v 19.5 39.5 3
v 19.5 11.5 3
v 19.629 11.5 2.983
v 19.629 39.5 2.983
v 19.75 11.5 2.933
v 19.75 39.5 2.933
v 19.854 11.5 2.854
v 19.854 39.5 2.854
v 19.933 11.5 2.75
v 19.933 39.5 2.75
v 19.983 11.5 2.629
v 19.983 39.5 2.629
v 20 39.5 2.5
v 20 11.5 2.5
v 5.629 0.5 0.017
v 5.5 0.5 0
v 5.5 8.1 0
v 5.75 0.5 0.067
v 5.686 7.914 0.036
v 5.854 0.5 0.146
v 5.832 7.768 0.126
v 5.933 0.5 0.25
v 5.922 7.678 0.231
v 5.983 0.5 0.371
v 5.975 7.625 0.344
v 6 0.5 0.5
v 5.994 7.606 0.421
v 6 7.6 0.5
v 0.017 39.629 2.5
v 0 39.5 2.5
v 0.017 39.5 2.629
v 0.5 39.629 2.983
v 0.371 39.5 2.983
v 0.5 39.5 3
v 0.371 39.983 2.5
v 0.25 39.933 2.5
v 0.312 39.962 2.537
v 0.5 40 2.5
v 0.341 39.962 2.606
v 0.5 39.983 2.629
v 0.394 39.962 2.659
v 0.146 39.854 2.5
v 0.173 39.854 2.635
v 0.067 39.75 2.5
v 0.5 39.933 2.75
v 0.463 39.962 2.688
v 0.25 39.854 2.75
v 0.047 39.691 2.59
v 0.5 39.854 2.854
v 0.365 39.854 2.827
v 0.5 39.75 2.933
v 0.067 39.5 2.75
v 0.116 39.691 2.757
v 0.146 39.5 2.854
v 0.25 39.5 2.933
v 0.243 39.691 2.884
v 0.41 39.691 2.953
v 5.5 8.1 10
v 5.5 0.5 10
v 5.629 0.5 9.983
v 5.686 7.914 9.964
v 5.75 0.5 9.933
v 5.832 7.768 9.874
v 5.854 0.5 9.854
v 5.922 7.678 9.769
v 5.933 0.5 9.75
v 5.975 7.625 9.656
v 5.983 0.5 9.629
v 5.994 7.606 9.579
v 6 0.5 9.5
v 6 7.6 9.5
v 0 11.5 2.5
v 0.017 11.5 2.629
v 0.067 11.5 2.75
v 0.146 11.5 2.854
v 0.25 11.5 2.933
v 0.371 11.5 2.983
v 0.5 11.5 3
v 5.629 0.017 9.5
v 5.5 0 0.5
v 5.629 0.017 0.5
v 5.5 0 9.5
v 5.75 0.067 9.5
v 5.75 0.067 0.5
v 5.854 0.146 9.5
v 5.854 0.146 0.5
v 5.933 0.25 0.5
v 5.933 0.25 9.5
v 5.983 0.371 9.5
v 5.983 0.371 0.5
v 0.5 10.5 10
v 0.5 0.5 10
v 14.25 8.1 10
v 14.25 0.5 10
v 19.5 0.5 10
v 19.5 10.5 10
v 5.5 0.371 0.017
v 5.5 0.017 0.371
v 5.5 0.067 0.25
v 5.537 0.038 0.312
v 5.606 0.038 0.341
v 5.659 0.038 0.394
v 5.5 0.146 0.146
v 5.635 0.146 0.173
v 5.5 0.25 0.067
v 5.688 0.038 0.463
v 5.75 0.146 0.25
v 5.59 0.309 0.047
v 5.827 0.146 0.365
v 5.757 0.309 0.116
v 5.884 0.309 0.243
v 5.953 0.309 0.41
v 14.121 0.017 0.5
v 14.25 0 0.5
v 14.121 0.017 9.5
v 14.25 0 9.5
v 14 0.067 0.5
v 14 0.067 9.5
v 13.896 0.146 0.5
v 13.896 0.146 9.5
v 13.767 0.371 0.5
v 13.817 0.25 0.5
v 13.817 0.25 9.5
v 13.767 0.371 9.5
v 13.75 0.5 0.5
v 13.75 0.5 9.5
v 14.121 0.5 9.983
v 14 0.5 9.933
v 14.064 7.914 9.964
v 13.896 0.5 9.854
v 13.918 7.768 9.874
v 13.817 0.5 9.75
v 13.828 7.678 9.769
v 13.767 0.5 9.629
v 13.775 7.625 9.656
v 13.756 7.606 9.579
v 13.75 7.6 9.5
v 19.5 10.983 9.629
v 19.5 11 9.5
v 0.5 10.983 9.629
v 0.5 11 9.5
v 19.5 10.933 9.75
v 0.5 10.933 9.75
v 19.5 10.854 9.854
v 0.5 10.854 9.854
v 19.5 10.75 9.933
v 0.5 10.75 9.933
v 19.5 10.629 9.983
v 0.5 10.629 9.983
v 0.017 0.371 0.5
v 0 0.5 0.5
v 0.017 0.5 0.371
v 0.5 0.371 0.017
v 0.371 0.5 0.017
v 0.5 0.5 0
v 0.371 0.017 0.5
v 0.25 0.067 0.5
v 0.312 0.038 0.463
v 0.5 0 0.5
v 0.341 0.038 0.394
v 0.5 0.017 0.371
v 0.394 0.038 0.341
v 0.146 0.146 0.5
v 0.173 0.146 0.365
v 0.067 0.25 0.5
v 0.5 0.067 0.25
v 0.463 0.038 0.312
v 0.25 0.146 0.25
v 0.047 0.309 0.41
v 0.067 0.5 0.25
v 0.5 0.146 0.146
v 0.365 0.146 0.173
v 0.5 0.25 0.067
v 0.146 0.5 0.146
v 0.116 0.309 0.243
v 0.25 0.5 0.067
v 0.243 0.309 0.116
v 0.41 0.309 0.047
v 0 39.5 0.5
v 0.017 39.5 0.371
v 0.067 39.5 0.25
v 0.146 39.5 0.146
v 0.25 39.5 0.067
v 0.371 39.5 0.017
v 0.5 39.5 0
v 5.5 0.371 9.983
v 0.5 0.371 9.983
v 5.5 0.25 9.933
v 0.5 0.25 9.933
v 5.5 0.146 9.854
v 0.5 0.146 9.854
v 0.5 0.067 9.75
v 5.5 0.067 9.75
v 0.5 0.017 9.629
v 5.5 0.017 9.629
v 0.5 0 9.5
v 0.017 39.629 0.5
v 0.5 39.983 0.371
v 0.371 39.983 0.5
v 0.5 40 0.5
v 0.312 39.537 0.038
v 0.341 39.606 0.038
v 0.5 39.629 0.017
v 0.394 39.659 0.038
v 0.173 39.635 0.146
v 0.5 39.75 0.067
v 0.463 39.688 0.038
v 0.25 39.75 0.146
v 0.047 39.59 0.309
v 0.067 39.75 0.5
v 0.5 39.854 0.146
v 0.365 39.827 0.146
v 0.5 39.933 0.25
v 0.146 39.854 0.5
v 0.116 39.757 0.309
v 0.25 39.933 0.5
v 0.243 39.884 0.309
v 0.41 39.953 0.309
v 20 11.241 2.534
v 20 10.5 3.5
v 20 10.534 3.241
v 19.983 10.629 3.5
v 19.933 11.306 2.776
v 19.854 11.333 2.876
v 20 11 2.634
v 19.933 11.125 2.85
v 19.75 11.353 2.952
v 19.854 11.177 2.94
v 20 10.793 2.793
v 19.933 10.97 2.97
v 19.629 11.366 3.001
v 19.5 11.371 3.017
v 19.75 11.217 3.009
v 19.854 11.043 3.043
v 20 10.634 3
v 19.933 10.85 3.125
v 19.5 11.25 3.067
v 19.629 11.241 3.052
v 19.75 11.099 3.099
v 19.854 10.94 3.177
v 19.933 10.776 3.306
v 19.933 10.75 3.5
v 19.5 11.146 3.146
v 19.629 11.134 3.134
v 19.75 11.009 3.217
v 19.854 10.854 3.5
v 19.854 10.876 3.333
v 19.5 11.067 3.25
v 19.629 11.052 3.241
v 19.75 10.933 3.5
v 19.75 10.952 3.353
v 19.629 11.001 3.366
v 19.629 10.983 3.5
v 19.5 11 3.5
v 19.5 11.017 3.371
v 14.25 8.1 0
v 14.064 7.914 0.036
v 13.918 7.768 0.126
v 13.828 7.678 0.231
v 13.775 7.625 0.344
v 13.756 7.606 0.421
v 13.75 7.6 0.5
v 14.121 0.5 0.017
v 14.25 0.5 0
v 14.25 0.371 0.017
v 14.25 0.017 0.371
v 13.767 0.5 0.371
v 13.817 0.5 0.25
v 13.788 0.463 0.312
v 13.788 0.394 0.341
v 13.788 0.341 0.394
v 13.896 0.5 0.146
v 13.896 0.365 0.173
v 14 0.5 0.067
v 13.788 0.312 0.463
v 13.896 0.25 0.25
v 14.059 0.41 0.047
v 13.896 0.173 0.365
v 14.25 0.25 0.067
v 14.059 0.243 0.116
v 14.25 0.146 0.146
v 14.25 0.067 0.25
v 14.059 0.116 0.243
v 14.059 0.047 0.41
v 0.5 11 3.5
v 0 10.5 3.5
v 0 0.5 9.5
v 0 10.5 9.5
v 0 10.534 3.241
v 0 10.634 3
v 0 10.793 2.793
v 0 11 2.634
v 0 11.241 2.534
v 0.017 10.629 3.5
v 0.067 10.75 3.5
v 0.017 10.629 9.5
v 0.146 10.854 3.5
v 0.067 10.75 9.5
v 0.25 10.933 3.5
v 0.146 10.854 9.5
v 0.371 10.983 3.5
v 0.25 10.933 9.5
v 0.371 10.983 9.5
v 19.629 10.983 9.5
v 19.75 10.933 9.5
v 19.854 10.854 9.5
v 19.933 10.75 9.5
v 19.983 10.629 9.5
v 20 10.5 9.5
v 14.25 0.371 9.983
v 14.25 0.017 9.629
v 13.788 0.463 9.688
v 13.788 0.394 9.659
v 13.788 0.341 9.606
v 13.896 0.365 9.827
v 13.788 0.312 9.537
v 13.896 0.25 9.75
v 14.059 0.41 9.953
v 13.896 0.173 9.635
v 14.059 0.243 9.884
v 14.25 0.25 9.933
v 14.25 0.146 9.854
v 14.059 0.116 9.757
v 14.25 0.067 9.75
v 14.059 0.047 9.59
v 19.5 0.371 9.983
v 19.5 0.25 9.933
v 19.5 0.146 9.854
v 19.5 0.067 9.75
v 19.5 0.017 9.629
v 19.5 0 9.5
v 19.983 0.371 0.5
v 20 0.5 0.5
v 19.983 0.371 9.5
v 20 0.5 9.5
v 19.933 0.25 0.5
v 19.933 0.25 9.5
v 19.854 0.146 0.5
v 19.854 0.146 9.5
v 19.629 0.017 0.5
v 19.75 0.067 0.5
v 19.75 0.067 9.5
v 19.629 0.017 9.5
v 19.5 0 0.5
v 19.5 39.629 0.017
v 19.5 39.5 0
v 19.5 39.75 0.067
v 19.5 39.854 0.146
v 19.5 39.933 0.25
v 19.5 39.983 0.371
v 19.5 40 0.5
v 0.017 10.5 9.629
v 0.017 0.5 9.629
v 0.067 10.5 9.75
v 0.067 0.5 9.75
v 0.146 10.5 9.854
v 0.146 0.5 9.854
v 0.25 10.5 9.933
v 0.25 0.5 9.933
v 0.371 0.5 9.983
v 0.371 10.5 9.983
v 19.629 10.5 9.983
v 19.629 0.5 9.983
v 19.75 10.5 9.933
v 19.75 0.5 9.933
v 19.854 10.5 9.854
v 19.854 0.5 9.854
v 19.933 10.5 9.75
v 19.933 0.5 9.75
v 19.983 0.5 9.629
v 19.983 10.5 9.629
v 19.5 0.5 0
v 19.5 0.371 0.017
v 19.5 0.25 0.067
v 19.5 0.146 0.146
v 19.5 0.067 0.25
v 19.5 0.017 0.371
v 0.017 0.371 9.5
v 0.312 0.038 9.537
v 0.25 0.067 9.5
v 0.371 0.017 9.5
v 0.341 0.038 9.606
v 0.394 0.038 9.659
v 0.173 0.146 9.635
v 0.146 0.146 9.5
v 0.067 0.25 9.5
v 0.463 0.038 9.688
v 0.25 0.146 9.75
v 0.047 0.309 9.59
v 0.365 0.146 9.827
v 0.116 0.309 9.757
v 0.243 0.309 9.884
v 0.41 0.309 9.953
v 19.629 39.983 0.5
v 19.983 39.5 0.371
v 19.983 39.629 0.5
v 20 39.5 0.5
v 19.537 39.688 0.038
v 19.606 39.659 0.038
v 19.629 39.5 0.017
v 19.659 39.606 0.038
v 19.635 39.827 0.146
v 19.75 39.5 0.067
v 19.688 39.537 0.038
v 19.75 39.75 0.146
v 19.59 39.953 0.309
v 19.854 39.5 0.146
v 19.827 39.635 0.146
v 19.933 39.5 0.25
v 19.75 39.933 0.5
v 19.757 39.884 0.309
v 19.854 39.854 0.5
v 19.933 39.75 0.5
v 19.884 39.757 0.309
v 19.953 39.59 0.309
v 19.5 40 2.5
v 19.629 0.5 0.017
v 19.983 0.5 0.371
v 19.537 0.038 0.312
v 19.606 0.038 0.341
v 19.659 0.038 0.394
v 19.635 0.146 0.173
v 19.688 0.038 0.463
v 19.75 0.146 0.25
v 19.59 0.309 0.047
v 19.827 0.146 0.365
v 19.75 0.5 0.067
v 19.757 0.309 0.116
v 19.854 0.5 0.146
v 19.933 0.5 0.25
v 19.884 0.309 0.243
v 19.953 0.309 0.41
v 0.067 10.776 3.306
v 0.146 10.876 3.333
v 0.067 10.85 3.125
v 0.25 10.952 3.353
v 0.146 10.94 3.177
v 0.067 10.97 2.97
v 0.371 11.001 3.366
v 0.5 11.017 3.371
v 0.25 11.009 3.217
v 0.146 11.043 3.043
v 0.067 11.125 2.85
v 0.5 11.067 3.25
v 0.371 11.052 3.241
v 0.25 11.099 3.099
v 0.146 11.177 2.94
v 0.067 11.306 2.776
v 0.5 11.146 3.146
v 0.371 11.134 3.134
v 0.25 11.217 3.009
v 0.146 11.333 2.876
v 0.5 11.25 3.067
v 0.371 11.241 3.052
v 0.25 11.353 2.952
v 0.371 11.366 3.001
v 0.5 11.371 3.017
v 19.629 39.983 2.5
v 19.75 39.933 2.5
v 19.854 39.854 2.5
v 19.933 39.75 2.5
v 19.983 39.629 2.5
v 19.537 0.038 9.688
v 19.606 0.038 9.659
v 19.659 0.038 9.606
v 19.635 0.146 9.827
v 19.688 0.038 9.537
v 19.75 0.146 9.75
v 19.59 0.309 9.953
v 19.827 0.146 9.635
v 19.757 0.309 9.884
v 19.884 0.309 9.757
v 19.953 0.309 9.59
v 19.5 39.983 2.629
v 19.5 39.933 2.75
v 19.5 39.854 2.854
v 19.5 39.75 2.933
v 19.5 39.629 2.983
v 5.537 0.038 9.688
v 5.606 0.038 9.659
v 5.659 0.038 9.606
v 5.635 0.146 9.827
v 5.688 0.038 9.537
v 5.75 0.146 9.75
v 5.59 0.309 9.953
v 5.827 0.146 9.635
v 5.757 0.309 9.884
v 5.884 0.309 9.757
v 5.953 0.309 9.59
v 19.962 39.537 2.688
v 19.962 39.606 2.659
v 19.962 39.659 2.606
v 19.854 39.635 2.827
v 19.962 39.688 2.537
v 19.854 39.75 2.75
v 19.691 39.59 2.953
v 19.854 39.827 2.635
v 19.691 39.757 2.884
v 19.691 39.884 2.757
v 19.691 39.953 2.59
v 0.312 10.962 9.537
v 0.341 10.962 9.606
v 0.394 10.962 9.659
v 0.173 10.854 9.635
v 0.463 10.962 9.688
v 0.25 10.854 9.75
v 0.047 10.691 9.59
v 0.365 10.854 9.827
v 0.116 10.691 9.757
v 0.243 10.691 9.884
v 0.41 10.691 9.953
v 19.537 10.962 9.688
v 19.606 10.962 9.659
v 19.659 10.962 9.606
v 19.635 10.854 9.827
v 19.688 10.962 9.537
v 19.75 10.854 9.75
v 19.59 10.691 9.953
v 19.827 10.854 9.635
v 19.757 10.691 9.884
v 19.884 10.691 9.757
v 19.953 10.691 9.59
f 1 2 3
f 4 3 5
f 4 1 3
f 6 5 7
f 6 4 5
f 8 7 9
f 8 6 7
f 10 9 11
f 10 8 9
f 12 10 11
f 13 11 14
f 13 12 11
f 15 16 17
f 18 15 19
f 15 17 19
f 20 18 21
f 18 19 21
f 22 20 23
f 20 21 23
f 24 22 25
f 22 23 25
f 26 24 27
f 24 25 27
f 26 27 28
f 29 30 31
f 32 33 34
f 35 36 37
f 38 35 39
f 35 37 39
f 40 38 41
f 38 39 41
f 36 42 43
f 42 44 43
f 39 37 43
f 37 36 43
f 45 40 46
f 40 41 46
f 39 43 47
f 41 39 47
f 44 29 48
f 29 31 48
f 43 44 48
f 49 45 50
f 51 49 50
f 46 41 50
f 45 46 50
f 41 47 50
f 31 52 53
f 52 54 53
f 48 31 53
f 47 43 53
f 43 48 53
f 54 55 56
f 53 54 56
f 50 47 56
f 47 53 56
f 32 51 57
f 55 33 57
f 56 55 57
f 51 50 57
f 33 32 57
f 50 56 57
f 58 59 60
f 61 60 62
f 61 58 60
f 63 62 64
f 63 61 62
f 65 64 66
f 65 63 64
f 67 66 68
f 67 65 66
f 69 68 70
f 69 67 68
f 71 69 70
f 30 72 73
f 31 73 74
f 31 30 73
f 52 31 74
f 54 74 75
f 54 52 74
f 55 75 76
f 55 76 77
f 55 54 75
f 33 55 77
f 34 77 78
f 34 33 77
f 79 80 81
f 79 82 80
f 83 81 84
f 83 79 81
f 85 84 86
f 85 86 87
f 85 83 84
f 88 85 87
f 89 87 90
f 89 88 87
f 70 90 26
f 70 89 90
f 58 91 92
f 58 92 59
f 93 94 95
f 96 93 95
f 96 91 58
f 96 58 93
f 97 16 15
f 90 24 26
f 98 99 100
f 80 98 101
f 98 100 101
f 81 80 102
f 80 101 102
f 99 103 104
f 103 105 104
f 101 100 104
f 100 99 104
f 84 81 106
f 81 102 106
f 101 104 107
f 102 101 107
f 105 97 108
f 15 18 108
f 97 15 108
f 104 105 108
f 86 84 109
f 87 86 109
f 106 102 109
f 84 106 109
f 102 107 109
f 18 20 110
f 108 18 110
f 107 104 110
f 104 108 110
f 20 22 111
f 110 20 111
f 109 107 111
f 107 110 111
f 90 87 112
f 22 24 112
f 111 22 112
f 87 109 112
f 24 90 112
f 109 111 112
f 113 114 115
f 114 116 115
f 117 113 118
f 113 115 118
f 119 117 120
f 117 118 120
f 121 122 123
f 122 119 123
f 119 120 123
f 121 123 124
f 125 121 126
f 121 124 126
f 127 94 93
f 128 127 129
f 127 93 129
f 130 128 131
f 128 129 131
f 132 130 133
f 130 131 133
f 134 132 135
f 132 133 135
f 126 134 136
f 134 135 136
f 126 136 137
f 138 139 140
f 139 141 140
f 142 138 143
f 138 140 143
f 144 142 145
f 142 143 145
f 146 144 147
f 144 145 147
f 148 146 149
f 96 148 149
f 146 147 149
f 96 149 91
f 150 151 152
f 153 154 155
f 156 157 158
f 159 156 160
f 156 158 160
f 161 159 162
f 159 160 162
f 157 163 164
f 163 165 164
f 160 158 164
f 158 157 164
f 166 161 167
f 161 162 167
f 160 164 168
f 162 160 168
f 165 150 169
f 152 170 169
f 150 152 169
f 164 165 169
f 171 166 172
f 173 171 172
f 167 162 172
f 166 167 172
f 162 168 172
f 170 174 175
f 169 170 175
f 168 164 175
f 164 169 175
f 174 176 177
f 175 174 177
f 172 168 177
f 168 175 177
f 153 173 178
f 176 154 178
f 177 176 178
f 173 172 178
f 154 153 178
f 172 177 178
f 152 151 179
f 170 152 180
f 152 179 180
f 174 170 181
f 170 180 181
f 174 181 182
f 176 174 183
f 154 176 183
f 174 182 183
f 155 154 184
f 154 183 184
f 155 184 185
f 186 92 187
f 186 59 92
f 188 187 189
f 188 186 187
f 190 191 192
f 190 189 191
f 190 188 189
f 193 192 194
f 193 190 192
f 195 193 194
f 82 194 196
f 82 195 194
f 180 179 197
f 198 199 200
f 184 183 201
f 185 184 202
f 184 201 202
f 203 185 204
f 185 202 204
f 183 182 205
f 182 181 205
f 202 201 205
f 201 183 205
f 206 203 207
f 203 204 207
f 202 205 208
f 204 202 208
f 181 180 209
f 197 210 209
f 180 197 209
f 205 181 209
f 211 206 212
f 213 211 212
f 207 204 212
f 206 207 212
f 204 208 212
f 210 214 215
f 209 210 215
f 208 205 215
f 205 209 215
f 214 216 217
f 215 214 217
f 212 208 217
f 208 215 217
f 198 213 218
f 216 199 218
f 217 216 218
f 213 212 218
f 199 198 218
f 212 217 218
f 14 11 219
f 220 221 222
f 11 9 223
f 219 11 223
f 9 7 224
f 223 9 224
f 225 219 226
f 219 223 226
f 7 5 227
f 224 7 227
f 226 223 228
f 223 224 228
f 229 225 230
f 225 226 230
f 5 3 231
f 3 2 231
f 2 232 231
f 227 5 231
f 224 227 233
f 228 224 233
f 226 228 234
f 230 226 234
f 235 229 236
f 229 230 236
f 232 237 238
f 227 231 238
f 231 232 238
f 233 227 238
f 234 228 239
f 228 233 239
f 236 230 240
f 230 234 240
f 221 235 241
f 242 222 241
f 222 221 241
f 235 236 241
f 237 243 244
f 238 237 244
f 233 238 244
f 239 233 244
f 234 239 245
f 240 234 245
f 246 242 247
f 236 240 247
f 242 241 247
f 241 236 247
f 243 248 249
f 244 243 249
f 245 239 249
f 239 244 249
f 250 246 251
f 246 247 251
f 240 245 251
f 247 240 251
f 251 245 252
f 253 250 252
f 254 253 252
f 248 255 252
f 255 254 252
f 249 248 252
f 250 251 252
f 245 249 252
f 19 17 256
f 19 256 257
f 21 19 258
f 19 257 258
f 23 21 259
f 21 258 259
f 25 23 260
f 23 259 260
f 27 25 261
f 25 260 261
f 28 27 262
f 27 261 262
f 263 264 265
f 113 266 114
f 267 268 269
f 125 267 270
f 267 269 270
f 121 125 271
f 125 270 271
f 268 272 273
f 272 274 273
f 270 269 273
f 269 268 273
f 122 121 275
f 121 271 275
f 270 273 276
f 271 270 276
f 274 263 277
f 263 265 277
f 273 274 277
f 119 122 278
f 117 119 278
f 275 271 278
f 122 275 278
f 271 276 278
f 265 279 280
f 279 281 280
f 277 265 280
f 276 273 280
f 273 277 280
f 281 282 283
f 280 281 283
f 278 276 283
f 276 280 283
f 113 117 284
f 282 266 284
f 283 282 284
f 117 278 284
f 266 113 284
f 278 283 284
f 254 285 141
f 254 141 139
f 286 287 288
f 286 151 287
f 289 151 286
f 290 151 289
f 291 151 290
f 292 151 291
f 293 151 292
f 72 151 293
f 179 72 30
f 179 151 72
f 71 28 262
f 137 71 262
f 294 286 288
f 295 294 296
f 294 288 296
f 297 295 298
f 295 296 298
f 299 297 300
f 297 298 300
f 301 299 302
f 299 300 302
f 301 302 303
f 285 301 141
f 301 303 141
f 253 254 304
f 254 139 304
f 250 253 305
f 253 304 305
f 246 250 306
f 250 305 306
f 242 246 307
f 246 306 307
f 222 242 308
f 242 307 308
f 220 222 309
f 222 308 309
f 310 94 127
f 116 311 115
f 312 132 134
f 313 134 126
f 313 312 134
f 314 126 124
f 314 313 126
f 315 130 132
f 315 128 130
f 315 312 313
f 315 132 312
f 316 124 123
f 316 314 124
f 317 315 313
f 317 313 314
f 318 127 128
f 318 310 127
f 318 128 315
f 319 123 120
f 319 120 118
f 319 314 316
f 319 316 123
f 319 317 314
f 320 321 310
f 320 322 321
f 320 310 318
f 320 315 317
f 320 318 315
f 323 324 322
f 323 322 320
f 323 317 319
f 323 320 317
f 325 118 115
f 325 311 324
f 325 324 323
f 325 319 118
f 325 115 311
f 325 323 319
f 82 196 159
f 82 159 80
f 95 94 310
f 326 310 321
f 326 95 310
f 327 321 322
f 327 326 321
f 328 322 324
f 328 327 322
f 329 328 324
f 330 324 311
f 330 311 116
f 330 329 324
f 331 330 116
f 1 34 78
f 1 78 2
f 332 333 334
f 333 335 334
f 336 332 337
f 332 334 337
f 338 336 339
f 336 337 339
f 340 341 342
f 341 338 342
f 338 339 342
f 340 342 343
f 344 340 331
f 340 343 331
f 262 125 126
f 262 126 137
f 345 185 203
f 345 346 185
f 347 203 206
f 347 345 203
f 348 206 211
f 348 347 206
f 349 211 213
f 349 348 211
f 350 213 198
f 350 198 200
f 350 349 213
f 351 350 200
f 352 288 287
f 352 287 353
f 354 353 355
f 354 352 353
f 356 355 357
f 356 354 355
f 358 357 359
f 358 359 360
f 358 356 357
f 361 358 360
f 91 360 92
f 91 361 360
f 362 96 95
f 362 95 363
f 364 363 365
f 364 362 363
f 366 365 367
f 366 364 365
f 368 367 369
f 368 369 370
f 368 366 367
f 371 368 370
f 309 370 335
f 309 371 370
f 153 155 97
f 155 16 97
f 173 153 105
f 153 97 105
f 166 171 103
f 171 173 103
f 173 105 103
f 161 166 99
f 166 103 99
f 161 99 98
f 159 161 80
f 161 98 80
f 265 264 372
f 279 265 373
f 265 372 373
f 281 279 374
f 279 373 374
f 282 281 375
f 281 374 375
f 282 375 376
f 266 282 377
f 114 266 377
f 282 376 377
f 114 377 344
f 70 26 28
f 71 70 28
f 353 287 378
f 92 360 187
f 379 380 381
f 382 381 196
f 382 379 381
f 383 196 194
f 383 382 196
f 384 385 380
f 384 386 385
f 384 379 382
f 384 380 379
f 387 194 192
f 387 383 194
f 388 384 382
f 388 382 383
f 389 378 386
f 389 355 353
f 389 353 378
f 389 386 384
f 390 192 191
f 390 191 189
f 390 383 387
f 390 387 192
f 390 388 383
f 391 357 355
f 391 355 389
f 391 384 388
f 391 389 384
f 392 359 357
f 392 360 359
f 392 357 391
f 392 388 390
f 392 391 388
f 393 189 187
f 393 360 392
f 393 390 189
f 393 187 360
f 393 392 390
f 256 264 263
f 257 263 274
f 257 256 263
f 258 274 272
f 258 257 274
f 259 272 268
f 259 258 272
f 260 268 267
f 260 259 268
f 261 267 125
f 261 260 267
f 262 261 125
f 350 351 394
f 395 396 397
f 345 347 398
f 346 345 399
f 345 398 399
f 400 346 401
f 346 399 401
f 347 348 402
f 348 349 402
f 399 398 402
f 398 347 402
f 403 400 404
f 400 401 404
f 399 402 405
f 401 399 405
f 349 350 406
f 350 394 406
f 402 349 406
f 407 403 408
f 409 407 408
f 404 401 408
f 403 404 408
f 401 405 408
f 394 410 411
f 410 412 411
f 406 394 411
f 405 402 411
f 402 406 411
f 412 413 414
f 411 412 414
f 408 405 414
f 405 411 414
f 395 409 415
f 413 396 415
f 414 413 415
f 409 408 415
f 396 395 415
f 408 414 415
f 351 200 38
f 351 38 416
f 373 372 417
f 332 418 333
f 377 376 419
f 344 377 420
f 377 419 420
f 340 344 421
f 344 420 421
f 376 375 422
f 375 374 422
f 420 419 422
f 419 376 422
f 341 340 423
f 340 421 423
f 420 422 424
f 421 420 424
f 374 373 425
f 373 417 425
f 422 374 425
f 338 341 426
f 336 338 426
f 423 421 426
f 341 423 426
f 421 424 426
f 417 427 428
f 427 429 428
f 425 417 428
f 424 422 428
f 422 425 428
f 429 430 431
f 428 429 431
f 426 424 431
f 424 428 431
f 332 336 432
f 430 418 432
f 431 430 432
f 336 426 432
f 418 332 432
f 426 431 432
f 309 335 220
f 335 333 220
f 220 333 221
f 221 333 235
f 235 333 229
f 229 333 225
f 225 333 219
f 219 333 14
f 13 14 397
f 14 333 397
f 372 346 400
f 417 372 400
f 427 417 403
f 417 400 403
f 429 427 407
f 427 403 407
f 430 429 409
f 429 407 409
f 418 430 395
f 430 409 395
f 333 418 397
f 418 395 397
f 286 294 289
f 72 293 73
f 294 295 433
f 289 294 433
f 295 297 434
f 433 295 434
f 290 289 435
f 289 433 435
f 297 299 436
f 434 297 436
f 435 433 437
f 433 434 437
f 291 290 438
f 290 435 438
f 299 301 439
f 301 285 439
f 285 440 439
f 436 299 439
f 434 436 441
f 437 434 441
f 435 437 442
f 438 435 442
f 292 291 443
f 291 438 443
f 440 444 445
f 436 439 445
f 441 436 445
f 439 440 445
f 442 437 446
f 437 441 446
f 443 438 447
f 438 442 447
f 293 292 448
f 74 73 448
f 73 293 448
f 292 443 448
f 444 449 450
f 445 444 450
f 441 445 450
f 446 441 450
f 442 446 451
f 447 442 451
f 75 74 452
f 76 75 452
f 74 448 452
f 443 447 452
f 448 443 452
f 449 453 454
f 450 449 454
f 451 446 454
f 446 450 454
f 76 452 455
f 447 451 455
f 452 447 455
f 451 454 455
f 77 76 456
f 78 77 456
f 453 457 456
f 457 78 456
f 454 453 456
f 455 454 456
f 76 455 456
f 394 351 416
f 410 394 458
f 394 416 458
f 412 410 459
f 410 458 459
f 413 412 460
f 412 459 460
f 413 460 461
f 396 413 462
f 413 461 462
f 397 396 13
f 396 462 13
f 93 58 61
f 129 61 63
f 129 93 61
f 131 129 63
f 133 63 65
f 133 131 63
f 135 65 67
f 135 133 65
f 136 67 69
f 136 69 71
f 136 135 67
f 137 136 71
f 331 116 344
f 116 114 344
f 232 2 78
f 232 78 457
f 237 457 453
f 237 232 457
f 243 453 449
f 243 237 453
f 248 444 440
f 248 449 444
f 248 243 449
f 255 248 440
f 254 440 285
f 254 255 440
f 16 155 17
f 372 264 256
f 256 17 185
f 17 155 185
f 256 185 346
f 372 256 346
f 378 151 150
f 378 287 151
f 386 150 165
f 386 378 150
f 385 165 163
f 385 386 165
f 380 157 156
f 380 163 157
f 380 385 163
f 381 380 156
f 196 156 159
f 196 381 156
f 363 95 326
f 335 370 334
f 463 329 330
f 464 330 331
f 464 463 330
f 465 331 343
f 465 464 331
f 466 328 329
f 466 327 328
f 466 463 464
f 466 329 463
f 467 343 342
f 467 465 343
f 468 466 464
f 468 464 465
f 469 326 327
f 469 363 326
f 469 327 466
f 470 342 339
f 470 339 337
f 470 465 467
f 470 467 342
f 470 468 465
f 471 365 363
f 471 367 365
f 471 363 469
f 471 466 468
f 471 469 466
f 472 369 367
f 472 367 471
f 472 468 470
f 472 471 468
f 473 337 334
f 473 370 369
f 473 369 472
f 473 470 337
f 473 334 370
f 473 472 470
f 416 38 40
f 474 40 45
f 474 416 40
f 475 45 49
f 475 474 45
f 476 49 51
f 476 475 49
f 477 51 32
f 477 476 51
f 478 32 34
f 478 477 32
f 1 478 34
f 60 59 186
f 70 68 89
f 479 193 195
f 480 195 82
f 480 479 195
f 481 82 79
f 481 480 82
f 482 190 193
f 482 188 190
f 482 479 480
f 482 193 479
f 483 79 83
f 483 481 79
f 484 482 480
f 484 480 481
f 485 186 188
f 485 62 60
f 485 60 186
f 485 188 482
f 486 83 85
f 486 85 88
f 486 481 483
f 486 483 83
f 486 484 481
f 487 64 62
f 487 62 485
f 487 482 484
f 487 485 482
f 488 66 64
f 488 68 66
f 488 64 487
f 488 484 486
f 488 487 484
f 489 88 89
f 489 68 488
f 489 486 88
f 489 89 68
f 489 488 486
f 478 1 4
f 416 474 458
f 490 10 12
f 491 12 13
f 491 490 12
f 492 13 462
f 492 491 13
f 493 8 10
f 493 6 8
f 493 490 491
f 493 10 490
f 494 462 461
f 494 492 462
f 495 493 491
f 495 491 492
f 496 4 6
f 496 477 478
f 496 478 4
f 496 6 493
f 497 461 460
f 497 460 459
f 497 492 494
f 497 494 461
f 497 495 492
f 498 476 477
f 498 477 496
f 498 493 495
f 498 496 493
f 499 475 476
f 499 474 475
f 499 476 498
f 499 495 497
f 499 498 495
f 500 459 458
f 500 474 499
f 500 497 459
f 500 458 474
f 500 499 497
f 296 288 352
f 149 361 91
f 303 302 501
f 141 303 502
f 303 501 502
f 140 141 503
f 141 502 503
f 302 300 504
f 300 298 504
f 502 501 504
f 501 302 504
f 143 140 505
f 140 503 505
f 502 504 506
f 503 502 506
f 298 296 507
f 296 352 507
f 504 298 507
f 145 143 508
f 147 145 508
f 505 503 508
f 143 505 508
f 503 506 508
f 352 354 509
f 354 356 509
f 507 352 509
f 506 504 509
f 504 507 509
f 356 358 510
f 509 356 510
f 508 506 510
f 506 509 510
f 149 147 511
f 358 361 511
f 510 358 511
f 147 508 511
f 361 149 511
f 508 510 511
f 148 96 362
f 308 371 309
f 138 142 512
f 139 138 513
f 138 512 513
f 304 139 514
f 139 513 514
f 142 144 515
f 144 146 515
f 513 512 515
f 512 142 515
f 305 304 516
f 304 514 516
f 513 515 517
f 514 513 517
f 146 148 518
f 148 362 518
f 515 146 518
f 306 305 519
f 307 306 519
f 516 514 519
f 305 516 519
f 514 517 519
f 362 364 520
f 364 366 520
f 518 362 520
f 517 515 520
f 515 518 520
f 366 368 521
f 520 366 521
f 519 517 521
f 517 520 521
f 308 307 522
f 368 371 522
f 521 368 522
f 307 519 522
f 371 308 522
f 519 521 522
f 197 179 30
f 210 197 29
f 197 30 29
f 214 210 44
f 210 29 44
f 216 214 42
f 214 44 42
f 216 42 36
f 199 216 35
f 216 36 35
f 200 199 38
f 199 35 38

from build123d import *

# Parameters (mm, degrees)
BOX002_W     = 20
BOX002_H     = 30
BOX002_DEPTH = 10
BOX_W        = 7.75
BOX_H        = 7.6
BOX_DEPTH    = 10
BOX001_W     = 20
BOX001_H     = 40
BOX001_DEPTH = 10
FILLET_R     = 0.5


with BuildPart() as cube002:
    # Box002 → Box002 (new body)
    with BuildSketch(Plane(origin=(0, 11, 3), x_dir=(1, 0, 0), z_dir=(0, 0, 1))):
        with Locations((10, 15)):
            Rectangle(BOX002_W, BOX002_H)
    extrude(amount=BOX002_DEPTH)


with BuildPart() as cube:
    # Box → Box (new body)
    with BuildSketch(Plane(origin=(6, 0, 0), x_dir=(1, 0, 0), z_dir=(0, 0, 1))):
        with Locations((3.875, 3.8)):
            Rectangle(BOX_W, BOX_H)
    extrude(amount=BOX_DEPTH)


with BuildPart() as fillet_body:
    # Box001 → Box001 (new body)
    with BuildSketch(Plane.XY):
        with Locations((10, 20)):
            Rectangle(BOX001_W, BOX001_H)
    extrude(amount=BOX001_DEPTH)

    # Cut: cut Cube
    add(cube.part, mode=Mode.SUBTRACT)

    # Cut001: cut Cube002
    add(cube002.part, mode=Mode.SUBTRACT)

    # Fillet
    fillet_edges = [fillet_body.edges().sort_by_distance(p)[0] for p in [
        (0, 5.5, 10),
        (0, 11, 6.5),
        (0, 25.5, 3),
        (0, 40, 1.5),
        (0, 20, 0),
        (0, 0, 5),
        (20, 5.5, 10),
        (16.875, 0, 10),
        (13.75, 3.8, 10),
        (9.875, 7.6, 10),
        (6, 3.8, 10),
        (3, 0, 10),
        (10, 11, 10),
        (20, 11, 6.5),
        (10, 11, 3),
        (10, 40, 3),
        (20, 25.5, 3),
        (20, 40, 1.5),
        (10, 40, 0),
        (20, 20, 0),
        (16.875, 0, 0),
        (13.75, 3.8, 0),
        (9.875, 7.6, 0),
        (6, 3.8, 0),
        (3, 0, 0),
        (6, 0, 5),
        (20, 0, 5),
        (13.75, 0, 5),
    ]]
    fillet(fillet_edges, radius=FILLET_R)


solid = fillet_body.part
